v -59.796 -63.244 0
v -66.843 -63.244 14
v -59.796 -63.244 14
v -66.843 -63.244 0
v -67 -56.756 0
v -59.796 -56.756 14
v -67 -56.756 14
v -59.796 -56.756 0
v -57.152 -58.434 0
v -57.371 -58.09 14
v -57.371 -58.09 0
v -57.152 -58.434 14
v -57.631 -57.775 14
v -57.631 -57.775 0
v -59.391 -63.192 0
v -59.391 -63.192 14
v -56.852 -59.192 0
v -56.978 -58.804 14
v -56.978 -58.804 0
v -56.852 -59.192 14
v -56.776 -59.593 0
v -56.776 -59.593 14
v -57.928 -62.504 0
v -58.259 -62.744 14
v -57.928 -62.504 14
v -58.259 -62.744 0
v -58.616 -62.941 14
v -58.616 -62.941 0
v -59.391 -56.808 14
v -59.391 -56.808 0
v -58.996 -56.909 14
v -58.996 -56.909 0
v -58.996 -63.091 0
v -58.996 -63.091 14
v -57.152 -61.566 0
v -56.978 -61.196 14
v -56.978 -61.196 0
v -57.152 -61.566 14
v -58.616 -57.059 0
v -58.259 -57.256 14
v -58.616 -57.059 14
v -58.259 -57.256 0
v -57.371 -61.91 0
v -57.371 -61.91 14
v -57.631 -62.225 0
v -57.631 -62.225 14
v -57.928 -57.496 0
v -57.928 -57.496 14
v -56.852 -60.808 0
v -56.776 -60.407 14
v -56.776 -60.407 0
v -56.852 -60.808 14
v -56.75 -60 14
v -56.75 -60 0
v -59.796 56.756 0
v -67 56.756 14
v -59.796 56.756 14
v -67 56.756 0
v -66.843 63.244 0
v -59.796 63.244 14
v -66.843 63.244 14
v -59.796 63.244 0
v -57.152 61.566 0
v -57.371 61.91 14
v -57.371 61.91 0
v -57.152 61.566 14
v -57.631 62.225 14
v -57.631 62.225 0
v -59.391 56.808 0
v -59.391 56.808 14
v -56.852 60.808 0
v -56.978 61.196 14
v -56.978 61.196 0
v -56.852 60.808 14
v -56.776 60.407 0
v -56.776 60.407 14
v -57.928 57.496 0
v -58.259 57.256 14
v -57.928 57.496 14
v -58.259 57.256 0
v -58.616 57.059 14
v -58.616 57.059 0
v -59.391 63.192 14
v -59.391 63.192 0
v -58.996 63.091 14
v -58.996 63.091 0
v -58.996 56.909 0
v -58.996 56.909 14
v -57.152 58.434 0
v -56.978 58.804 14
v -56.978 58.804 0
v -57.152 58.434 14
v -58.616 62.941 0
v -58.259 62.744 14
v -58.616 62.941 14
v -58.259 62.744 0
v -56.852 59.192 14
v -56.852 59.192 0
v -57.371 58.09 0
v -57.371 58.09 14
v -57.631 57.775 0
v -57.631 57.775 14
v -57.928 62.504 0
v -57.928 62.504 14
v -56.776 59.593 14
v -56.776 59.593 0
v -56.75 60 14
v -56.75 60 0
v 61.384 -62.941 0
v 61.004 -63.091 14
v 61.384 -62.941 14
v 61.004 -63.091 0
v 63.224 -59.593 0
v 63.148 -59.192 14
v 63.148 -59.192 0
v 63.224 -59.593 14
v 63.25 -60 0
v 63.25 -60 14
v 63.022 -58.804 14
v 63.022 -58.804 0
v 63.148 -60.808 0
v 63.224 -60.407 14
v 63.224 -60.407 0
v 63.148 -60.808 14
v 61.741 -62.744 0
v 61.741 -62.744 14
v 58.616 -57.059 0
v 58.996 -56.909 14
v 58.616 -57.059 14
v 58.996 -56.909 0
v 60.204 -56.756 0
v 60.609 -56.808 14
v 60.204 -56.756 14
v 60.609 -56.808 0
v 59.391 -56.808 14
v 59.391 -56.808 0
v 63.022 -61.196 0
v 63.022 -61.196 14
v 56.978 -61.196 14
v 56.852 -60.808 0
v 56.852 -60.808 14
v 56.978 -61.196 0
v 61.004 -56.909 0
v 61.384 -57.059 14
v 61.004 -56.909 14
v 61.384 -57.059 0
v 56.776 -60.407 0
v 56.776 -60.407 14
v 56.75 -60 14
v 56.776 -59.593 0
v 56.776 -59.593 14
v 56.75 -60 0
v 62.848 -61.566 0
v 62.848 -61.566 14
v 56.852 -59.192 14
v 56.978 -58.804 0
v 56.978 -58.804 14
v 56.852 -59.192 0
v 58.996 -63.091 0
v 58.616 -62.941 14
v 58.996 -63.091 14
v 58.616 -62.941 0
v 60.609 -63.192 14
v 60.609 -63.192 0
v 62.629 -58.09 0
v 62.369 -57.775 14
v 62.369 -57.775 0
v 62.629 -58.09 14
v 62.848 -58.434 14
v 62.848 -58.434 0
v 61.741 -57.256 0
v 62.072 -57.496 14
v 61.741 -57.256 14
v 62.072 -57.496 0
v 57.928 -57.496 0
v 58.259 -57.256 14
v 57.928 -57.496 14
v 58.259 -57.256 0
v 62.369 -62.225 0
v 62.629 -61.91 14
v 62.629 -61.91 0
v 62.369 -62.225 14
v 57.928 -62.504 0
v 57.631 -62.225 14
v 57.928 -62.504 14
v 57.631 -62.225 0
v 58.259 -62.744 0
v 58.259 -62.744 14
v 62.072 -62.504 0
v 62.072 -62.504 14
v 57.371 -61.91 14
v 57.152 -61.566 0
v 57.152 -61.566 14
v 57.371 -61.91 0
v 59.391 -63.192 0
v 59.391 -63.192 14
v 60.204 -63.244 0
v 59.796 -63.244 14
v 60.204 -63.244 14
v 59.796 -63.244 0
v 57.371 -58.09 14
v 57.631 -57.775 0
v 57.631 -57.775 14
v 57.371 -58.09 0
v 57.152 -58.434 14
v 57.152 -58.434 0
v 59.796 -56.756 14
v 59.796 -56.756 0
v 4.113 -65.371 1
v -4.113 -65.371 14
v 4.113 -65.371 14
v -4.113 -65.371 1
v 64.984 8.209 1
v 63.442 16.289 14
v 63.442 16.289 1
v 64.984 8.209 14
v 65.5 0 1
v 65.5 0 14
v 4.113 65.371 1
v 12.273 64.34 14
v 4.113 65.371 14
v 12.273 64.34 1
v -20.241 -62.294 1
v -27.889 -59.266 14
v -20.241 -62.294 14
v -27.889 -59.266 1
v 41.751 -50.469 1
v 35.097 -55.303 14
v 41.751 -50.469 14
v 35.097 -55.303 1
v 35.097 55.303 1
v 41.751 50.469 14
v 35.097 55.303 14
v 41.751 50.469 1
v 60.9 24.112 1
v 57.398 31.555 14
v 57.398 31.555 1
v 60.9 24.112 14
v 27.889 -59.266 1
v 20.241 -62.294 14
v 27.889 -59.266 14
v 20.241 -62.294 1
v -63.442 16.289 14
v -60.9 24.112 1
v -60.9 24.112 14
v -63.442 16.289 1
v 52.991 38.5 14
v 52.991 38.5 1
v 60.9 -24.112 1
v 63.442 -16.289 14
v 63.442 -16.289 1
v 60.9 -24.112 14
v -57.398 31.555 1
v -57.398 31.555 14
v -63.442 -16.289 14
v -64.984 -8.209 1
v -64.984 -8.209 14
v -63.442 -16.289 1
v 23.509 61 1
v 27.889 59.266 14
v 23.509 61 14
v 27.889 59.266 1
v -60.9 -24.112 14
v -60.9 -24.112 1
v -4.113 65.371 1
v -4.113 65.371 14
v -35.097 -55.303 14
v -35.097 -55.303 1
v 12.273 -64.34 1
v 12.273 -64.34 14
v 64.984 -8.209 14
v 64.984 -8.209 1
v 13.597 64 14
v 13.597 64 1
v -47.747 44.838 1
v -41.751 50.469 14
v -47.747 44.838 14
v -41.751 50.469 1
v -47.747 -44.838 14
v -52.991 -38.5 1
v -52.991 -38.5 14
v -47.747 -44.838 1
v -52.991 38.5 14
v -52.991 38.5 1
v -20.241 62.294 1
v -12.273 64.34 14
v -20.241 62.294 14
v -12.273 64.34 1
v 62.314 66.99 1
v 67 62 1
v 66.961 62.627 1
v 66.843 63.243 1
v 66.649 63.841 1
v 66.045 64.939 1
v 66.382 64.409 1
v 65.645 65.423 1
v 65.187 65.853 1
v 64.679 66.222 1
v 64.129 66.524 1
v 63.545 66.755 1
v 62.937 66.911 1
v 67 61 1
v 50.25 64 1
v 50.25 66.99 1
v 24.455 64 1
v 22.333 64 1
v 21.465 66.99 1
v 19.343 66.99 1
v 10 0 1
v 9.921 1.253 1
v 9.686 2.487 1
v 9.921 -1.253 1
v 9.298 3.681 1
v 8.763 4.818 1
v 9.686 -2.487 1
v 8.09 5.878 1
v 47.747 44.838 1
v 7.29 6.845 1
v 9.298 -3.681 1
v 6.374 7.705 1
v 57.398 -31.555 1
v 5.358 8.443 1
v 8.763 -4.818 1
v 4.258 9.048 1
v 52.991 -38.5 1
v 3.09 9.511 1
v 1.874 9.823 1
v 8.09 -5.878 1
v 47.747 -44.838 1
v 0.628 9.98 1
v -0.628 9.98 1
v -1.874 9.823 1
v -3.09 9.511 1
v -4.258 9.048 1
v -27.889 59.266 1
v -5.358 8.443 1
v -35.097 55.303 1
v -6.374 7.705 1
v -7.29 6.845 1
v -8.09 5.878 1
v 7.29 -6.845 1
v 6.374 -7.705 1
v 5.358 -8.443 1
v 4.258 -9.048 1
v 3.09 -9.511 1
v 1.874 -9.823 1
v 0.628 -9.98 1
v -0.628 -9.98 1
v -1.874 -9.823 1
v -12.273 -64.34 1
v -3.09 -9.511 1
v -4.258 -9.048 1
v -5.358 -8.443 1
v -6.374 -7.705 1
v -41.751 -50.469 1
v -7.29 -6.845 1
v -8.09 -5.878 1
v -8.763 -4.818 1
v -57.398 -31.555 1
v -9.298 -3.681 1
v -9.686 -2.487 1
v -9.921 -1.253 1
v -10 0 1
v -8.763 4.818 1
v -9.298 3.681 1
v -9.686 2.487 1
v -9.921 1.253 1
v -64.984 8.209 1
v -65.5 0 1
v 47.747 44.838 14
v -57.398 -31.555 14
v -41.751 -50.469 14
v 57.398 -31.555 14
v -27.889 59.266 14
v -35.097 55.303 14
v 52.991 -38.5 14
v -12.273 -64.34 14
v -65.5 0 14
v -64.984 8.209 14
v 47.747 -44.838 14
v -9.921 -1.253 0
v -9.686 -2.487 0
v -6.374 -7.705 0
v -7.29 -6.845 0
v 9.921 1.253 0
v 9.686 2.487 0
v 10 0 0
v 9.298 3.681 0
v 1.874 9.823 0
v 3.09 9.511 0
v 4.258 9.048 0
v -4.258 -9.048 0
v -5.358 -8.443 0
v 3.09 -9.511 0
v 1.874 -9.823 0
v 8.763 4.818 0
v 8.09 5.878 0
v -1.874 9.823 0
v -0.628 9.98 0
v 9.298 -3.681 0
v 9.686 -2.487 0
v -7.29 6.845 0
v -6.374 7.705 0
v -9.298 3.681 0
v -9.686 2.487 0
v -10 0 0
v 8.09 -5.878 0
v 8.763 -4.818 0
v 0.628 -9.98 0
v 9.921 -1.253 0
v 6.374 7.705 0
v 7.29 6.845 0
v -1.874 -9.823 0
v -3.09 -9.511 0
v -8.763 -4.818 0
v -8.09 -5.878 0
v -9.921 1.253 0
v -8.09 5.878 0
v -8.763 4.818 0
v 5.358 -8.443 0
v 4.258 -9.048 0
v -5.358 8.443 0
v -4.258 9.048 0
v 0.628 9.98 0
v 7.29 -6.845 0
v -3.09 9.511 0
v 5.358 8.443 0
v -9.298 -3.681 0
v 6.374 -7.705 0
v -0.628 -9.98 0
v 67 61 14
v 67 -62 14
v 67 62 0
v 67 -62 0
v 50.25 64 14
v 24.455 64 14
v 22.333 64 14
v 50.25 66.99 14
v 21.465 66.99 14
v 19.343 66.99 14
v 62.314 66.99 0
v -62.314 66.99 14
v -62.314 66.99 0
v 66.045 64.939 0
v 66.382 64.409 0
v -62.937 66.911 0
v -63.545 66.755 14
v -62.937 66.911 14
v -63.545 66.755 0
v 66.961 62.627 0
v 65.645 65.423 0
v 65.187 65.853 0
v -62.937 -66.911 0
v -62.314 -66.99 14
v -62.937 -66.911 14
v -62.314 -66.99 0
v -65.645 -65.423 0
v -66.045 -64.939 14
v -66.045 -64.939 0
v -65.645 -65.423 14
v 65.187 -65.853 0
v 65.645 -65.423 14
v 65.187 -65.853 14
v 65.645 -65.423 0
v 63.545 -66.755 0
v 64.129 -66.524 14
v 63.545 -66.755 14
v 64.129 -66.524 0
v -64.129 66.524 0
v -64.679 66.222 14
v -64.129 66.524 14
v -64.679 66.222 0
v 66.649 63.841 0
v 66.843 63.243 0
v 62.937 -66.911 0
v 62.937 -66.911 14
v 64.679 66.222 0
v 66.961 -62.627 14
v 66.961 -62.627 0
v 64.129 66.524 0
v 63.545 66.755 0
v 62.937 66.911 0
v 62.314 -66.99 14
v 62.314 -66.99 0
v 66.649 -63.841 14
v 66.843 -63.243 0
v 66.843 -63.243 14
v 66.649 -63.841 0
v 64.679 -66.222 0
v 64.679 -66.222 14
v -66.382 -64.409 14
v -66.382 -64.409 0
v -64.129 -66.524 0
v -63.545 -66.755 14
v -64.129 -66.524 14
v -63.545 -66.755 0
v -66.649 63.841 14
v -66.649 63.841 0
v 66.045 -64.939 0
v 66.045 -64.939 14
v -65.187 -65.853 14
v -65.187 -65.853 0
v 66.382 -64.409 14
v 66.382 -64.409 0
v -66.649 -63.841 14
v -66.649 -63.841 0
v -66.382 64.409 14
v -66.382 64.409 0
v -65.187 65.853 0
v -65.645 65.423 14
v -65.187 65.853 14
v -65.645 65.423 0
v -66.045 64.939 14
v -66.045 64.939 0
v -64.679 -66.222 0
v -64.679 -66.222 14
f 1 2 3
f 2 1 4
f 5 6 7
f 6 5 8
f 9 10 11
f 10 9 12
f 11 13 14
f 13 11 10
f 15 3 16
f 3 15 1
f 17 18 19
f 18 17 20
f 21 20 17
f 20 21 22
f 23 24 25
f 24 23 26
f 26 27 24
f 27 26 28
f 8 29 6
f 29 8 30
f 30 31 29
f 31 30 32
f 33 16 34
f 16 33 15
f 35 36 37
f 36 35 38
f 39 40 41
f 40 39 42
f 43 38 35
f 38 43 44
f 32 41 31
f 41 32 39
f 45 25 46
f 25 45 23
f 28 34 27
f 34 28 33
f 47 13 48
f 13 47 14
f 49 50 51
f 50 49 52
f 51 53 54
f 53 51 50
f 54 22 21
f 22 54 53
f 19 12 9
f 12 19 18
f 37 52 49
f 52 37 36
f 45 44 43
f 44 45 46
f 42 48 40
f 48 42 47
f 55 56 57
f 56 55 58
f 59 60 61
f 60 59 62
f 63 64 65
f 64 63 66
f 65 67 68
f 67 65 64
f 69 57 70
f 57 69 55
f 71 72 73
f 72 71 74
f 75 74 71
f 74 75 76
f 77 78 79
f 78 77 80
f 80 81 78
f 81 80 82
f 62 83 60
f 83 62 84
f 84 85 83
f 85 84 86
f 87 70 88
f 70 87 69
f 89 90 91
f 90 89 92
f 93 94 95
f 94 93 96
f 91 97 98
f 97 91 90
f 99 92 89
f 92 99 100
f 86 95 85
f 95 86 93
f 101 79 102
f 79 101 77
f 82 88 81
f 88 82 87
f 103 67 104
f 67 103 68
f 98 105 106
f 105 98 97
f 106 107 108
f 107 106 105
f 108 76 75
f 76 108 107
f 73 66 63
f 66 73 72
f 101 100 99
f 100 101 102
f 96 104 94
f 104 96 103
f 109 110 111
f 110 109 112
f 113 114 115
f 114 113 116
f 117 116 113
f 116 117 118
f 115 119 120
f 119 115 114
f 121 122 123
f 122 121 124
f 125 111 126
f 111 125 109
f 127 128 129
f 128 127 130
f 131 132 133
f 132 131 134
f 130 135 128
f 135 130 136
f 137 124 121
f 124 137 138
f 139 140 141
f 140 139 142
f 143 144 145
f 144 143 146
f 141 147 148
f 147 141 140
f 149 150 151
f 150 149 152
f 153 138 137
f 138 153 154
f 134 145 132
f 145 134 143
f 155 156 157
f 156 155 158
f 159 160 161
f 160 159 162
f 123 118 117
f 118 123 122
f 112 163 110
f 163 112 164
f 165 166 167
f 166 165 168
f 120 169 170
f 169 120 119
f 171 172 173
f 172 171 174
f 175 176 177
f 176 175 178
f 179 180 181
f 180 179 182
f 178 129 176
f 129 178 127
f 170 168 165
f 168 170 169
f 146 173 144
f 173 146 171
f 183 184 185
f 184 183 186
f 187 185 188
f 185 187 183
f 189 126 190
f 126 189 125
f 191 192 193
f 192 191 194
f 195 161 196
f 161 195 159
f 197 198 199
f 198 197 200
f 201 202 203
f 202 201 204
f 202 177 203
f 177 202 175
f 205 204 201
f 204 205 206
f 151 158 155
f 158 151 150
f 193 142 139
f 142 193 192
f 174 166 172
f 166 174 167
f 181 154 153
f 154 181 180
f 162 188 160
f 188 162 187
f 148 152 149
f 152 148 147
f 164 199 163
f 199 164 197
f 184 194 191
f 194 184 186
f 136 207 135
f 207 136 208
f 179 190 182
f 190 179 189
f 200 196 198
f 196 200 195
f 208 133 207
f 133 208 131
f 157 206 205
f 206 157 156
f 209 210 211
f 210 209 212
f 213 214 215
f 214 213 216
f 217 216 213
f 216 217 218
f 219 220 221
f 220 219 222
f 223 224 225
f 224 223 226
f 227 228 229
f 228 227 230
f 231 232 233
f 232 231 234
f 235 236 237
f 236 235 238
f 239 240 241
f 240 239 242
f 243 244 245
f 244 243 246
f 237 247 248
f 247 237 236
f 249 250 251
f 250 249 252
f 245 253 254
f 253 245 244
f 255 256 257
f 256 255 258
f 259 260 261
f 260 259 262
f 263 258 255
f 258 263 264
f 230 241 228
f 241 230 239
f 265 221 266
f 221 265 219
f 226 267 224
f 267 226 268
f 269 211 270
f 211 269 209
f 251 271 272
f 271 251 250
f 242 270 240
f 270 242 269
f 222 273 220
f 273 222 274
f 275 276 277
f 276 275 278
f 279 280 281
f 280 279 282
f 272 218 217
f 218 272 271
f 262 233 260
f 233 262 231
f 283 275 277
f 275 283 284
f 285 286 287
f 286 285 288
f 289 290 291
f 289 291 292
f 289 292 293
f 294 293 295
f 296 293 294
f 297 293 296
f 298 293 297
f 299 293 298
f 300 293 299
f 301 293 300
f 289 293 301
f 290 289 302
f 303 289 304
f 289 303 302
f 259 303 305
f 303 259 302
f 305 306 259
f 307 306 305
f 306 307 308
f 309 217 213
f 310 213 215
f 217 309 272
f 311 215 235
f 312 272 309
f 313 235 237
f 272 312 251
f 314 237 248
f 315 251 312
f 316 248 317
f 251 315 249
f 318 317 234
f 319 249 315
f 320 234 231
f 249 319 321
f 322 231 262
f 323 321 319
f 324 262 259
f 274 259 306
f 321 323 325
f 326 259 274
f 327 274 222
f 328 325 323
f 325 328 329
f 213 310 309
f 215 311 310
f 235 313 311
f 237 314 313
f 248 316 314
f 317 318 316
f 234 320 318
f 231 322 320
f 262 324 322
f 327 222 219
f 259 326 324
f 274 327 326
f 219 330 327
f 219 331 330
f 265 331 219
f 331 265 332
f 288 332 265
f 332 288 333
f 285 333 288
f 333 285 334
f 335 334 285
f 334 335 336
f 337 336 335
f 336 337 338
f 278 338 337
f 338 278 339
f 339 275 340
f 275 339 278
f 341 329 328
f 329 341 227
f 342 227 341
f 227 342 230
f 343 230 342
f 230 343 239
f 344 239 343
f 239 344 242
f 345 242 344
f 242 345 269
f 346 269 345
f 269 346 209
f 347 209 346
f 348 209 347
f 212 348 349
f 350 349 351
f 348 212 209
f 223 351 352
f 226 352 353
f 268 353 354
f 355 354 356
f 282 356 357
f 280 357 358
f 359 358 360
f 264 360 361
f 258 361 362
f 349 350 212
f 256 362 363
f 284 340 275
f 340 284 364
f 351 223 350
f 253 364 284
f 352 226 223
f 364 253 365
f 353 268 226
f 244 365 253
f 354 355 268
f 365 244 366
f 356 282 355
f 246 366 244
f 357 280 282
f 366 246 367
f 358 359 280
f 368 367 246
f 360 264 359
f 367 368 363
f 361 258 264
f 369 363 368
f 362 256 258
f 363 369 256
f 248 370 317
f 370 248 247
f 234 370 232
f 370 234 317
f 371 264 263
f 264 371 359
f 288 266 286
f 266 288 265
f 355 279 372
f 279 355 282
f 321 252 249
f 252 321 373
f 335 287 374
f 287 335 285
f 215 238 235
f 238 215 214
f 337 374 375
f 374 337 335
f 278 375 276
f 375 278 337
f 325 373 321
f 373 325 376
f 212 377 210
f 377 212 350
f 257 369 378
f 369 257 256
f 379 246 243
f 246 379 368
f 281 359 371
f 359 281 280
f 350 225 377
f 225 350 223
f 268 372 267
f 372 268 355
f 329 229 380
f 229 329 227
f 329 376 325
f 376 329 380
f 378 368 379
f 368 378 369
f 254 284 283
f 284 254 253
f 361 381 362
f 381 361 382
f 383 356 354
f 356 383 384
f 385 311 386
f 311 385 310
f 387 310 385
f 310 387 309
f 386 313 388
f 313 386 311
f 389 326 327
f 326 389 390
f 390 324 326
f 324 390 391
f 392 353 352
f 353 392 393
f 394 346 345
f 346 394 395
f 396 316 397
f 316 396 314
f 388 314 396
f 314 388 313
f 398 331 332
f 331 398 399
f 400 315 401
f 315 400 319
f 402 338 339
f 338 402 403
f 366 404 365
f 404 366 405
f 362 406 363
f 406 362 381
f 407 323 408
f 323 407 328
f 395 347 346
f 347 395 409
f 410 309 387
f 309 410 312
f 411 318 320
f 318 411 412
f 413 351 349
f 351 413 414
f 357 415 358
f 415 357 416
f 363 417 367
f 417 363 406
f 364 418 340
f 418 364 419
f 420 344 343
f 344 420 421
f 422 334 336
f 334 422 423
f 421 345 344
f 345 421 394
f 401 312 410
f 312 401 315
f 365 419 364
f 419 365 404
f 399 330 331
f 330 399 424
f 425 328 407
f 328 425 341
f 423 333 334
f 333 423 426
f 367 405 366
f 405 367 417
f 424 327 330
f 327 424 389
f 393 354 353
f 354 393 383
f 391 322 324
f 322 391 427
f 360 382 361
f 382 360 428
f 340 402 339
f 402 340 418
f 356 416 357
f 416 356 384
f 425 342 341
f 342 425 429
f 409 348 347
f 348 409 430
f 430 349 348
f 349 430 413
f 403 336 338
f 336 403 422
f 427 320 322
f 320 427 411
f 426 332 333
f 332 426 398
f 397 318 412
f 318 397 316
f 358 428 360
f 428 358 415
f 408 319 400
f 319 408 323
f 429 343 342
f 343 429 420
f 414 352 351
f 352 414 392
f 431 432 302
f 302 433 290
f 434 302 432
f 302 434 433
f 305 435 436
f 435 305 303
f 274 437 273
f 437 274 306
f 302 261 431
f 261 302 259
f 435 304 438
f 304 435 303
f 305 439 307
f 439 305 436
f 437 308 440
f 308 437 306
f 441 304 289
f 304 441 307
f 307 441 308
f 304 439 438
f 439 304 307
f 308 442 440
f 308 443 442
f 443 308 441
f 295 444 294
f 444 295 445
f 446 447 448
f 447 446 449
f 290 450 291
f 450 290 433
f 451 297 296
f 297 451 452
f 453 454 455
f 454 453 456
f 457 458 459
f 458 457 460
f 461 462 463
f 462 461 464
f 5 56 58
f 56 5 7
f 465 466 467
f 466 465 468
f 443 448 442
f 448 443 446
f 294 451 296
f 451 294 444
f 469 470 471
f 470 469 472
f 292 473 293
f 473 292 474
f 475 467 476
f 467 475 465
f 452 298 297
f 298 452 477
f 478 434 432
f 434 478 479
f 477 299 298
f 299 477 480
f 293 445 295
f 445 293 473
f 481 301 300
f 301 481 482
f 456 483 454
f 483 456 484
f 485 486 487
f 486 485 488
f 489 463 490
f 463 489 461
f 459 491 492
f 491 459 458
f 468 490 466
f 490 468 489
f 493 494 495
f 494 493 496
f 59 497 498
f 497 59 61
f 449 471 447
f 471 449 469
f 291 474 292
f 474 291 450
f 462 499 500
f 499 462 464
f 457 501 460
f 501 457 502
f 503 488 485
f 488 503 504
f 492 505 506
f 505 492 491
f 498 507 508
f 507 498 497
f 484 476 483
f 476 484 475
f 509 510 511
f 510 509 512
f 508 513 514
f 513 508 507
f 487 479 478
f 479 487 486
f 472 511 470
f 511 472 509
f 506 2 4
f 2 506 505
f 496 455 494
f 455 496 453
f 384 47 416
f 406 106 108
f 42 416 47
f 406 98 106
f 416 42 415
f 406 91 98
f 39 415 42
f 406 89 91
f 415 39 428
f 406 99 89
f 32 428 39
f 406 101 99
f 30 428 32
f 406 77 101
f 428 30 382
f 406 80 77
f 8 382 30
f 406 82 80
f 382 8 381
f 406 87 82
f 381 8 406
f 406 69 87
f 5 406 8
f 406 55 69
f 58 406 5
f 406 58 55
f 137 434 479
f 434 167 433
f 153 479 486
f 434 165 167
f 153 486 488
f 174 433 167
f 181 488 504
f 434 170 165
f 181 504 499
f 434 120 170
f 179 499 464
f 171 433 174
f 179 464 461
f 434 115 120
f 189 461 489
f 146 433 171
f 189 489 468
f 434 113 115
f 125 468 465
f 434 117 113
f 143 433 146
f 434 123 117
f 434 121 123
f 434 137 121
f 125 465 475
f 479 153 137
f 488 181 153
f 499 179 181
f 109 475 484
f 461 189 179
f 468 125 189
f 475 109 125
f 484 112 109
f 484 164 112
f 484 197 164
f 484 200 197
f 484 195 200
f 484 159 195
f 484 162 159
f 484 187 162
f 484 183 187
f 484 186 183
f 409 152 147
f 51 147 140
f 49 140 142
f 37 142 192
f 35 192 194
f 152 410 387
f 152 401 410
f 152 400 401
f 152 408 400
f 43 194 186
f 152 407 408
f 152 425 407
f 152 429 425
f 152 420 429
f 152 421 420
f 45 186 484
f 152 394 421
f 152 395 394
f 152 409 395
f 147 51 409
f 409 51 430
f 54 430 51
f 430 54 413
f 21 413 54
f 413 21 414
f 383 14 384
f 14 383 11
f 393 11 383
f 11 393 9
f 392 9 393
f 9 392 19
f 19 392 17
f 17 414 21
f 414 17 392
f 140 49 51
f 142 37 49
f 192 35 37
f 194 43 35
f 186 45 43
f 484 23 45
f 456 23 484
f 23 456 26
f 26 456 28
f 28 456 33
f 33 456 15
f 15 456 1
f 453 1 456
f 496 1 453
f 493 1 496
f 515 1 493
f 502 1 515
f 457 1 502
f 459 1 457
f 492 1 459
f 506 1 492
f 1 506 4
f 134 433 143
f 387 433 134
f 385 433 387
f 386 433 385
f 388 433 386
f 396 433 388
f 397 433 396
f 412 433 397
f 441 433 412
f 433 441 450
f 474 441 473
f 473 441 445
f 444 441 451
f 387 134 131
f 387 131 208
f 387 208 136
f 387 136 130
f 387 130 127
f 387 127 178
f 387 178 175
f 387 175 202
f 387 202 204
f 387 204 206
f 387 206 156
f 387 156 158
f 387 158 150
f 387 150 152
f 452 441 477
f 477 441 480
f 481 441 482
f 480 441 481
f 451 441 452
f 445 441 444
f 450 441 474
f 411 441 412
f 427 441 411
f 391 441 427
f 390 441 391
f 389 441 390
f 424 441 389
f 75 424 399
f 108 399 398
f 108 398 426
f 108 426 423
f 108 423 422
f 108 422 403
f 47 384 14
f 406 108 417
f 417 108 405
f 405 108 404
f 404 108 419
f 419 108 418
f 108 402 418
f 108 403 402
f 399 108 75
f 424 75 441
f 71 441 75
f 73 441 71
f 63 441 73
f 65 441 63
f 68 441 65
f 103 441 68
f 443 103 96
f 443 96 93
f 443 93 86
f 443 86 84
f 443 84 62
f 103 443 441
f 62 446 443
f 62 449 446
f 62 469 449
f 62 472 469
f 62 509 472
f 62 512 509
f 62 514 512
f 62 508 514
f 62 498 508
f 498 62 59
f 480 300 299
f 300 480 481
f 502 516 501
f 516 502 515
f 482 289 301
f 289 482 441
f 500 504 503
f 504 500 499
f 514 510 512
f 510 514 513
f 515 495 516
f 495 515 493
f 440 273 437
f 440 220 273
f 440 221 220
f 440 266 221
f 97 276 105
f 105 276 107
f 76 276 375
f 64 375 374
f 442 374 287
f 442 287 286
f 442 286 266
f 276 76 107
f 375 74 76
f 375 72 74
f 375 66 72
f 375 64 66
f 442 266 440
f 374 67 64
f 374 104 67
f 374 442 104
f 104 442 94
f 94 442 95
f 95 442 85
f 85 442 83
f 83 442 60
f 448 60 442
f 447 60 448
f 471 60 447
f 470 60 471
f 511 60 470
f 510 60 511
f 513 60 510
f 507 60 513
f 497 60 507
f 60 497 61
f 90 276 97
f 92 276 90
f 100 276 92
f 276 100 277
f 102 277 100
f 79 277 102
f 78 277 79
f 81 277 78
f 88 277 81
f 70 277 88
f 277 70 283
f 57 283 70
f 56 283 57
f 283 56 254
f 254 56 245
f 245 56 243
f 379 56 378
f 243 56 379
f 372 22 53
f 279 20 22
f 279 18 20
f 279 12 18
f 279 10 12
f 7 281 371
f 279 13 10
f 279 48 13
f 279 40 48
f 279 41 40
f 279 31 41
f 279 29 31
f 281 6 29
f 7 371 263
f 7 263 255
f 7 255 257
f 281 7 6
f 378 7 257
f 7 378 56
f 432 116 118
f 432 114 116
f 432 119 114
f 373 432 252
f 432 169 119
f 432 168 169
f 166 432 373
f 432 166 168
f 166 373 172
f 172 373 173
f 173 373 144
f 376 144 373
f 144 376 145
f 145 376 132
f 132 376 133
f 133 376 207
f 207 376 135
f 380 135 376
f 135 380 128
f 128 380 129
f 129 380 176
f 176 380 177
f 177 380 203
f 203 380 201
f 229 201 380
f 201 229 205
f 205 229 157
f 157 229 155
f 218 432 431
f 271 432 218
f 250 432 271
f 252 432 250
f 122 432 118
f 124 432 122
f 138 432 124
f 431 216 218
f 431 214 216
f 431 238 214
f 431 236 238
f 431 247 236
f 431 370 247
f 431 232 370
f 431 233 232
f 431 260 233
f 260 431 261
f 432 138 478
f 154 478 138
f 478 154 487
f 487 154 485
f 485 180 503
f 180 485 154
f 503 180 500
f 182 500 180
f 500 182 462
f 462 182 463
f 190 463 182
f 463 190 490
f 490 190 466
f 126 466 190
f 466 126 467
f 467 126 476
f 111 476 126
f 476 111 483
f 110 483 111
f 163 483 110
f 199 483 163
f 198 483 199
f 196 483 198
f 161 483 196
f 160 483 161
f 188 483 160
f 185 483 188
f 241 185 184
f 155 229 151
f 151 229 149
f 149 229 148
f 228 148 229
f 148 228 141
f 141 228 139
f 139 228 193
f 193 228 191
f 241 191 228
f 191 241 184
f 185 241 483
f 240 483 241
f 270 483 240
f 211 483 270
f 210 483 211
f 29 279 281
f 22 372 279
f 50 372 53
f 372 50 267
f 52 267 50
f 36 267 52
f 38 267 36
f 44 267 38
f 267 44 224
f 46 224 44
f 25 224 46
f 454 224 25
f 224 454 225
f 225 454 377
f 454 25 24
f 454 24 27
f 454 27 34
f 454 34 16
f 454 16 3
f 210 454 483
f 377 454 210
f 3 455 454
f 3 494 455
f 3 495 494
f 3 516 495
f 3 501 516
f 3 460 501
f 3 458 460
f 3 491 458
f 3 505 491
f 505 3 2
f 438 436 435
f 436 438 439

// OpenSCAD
$fn = 50;


difference() {
	union() {
		translate(v = [0, 0, 0]) {
			rotate(a = [0, 0, 0]) {
				hull() {
					translate(v = [-62.0000000000, 62.0000000000, 0]) {
						rotate(a = [0, 0, 0]) {
							translate(v = [0, 0, 0]) {
								rotate(a = [0, 0, 0]) {
									cylinder(h = 14, r = 5);
								}
							}
						}
					}
					translate(v = [62.0000000000, 62.0000000000, 0]) {
						rotate(a = [0, 0, 0]) {
							translate(v = [0, 0, 0]) {
								rotate(a = [0, 0, 0]) {
									cylinder(h = 14, r = 5);
								}
							}
						}
					}
					translate(v = [-62.0000000000, -62.0000000000, 0]) {
						rotate(a = [0, 0, 0]) {
							translate(v = [0, 0, 0]) {
								rotate(a = [0, 0, 0]) {
									cylinder(h = 14, r = 5);
								}
							}
						}
					}
					translate(v = [62.0000000000, -62.0000000000, 0]) {
						rotate(a = [0, 0, 0]) {
							translate(v = [0, 0, 0]) {
								rotate(a = [0, 0, 0]) {
									cylinder(h = 14, r = 5);
								}
							}
						}
					}
				}
			}
		}
	}
	union() {
		translate(v = [-67.5000000000, -60.0000000000, -125]) {
			rotate(a = [0, 0, 0]) {
				hull() {
					translate(v = [7.5000000000, 0, 0]) {
						rotate(a = [0, 0, 0]) {
							translate(v = [0, 0, 0]) {
								rotate(a = [0, 0, 0]) {
									cylinder(h = 250, r = 3.2500000000);
								}
							}
						}
					}
					translate(v = [-7.5000000000, 0, 0]) {
						rotate(a = [0, 0, 0]) {
							translate(v = [0, 0, 0]) {
								rotate(a = [0, 0, 0]) {
									cylinder(h = 250, r = 3.2500000000);
								}
							}
						}
					}
				}
			}
		}
		translate(v = [-67.5000000000, 60.0000000000, -125]) {
			rotate(a = [0, 0, 0]) {
				hull() {
					translate(v = [7.5000000000, 0, 0]) {
						rotate(a = [0, 0, 0]) {
							translate(v = [0, 0, 0]) {
								rotate(a = [0, 0, 0]) {
									cylinder(h = 250, r = 3.2500000000);
								}
							}
						}
					}
					translate(v = [-7.5000000000, 0, 0]) {
						rotate(a = [0, 0, 0]) {
							translate(v = [0, 0, 0]) {
								rotate(a = [0, 0, 0]) {
									cylinder(h = 250, r = 3.2500000000);
								}
							}
						}
					}
				}
			}
		}
		translate(v = [60.0000000000, -60.0000000000, -125.0000000000]) {
			rotate(a = [0, 0, 0]) {
				cylinder(h = 250, r = 3.2500000000);
			}
		}
		translate(v = [0, 0, 1.0000000000]) {
			rotate(a = [0, 0, 0]) {
				cylinder(h = 16, r = 65.5000000000);
			}
		}
		translate(v = [0, 0, -7.0000000000]) {
			rotate(a = [0, 0, 0]) {
				cylinder(h = 14, r = 10.0000000000);
			}
		}
		translate(v = [0.0000000000, 61.0000000000, 1]) {
			rotate(a = [0, 0, 0]) {
				cube(size = [67.0000000000, 3, 16]);
			}
		}
		translate(v = [50.2500000000, 61.0000000000, 1]) {
			rotate(a = [0, 0, 0]) {
				cube(size = [16.7500000000, 6, 16]);
			}
		}
		translate(v = [18.5833333333, 67.7500000000, 1]) {
			rotate(a = [0, 0, -45]) {
				cube(size = [7.5000000000, 1.5000000000, 16]);
			}
		}
	}
}
